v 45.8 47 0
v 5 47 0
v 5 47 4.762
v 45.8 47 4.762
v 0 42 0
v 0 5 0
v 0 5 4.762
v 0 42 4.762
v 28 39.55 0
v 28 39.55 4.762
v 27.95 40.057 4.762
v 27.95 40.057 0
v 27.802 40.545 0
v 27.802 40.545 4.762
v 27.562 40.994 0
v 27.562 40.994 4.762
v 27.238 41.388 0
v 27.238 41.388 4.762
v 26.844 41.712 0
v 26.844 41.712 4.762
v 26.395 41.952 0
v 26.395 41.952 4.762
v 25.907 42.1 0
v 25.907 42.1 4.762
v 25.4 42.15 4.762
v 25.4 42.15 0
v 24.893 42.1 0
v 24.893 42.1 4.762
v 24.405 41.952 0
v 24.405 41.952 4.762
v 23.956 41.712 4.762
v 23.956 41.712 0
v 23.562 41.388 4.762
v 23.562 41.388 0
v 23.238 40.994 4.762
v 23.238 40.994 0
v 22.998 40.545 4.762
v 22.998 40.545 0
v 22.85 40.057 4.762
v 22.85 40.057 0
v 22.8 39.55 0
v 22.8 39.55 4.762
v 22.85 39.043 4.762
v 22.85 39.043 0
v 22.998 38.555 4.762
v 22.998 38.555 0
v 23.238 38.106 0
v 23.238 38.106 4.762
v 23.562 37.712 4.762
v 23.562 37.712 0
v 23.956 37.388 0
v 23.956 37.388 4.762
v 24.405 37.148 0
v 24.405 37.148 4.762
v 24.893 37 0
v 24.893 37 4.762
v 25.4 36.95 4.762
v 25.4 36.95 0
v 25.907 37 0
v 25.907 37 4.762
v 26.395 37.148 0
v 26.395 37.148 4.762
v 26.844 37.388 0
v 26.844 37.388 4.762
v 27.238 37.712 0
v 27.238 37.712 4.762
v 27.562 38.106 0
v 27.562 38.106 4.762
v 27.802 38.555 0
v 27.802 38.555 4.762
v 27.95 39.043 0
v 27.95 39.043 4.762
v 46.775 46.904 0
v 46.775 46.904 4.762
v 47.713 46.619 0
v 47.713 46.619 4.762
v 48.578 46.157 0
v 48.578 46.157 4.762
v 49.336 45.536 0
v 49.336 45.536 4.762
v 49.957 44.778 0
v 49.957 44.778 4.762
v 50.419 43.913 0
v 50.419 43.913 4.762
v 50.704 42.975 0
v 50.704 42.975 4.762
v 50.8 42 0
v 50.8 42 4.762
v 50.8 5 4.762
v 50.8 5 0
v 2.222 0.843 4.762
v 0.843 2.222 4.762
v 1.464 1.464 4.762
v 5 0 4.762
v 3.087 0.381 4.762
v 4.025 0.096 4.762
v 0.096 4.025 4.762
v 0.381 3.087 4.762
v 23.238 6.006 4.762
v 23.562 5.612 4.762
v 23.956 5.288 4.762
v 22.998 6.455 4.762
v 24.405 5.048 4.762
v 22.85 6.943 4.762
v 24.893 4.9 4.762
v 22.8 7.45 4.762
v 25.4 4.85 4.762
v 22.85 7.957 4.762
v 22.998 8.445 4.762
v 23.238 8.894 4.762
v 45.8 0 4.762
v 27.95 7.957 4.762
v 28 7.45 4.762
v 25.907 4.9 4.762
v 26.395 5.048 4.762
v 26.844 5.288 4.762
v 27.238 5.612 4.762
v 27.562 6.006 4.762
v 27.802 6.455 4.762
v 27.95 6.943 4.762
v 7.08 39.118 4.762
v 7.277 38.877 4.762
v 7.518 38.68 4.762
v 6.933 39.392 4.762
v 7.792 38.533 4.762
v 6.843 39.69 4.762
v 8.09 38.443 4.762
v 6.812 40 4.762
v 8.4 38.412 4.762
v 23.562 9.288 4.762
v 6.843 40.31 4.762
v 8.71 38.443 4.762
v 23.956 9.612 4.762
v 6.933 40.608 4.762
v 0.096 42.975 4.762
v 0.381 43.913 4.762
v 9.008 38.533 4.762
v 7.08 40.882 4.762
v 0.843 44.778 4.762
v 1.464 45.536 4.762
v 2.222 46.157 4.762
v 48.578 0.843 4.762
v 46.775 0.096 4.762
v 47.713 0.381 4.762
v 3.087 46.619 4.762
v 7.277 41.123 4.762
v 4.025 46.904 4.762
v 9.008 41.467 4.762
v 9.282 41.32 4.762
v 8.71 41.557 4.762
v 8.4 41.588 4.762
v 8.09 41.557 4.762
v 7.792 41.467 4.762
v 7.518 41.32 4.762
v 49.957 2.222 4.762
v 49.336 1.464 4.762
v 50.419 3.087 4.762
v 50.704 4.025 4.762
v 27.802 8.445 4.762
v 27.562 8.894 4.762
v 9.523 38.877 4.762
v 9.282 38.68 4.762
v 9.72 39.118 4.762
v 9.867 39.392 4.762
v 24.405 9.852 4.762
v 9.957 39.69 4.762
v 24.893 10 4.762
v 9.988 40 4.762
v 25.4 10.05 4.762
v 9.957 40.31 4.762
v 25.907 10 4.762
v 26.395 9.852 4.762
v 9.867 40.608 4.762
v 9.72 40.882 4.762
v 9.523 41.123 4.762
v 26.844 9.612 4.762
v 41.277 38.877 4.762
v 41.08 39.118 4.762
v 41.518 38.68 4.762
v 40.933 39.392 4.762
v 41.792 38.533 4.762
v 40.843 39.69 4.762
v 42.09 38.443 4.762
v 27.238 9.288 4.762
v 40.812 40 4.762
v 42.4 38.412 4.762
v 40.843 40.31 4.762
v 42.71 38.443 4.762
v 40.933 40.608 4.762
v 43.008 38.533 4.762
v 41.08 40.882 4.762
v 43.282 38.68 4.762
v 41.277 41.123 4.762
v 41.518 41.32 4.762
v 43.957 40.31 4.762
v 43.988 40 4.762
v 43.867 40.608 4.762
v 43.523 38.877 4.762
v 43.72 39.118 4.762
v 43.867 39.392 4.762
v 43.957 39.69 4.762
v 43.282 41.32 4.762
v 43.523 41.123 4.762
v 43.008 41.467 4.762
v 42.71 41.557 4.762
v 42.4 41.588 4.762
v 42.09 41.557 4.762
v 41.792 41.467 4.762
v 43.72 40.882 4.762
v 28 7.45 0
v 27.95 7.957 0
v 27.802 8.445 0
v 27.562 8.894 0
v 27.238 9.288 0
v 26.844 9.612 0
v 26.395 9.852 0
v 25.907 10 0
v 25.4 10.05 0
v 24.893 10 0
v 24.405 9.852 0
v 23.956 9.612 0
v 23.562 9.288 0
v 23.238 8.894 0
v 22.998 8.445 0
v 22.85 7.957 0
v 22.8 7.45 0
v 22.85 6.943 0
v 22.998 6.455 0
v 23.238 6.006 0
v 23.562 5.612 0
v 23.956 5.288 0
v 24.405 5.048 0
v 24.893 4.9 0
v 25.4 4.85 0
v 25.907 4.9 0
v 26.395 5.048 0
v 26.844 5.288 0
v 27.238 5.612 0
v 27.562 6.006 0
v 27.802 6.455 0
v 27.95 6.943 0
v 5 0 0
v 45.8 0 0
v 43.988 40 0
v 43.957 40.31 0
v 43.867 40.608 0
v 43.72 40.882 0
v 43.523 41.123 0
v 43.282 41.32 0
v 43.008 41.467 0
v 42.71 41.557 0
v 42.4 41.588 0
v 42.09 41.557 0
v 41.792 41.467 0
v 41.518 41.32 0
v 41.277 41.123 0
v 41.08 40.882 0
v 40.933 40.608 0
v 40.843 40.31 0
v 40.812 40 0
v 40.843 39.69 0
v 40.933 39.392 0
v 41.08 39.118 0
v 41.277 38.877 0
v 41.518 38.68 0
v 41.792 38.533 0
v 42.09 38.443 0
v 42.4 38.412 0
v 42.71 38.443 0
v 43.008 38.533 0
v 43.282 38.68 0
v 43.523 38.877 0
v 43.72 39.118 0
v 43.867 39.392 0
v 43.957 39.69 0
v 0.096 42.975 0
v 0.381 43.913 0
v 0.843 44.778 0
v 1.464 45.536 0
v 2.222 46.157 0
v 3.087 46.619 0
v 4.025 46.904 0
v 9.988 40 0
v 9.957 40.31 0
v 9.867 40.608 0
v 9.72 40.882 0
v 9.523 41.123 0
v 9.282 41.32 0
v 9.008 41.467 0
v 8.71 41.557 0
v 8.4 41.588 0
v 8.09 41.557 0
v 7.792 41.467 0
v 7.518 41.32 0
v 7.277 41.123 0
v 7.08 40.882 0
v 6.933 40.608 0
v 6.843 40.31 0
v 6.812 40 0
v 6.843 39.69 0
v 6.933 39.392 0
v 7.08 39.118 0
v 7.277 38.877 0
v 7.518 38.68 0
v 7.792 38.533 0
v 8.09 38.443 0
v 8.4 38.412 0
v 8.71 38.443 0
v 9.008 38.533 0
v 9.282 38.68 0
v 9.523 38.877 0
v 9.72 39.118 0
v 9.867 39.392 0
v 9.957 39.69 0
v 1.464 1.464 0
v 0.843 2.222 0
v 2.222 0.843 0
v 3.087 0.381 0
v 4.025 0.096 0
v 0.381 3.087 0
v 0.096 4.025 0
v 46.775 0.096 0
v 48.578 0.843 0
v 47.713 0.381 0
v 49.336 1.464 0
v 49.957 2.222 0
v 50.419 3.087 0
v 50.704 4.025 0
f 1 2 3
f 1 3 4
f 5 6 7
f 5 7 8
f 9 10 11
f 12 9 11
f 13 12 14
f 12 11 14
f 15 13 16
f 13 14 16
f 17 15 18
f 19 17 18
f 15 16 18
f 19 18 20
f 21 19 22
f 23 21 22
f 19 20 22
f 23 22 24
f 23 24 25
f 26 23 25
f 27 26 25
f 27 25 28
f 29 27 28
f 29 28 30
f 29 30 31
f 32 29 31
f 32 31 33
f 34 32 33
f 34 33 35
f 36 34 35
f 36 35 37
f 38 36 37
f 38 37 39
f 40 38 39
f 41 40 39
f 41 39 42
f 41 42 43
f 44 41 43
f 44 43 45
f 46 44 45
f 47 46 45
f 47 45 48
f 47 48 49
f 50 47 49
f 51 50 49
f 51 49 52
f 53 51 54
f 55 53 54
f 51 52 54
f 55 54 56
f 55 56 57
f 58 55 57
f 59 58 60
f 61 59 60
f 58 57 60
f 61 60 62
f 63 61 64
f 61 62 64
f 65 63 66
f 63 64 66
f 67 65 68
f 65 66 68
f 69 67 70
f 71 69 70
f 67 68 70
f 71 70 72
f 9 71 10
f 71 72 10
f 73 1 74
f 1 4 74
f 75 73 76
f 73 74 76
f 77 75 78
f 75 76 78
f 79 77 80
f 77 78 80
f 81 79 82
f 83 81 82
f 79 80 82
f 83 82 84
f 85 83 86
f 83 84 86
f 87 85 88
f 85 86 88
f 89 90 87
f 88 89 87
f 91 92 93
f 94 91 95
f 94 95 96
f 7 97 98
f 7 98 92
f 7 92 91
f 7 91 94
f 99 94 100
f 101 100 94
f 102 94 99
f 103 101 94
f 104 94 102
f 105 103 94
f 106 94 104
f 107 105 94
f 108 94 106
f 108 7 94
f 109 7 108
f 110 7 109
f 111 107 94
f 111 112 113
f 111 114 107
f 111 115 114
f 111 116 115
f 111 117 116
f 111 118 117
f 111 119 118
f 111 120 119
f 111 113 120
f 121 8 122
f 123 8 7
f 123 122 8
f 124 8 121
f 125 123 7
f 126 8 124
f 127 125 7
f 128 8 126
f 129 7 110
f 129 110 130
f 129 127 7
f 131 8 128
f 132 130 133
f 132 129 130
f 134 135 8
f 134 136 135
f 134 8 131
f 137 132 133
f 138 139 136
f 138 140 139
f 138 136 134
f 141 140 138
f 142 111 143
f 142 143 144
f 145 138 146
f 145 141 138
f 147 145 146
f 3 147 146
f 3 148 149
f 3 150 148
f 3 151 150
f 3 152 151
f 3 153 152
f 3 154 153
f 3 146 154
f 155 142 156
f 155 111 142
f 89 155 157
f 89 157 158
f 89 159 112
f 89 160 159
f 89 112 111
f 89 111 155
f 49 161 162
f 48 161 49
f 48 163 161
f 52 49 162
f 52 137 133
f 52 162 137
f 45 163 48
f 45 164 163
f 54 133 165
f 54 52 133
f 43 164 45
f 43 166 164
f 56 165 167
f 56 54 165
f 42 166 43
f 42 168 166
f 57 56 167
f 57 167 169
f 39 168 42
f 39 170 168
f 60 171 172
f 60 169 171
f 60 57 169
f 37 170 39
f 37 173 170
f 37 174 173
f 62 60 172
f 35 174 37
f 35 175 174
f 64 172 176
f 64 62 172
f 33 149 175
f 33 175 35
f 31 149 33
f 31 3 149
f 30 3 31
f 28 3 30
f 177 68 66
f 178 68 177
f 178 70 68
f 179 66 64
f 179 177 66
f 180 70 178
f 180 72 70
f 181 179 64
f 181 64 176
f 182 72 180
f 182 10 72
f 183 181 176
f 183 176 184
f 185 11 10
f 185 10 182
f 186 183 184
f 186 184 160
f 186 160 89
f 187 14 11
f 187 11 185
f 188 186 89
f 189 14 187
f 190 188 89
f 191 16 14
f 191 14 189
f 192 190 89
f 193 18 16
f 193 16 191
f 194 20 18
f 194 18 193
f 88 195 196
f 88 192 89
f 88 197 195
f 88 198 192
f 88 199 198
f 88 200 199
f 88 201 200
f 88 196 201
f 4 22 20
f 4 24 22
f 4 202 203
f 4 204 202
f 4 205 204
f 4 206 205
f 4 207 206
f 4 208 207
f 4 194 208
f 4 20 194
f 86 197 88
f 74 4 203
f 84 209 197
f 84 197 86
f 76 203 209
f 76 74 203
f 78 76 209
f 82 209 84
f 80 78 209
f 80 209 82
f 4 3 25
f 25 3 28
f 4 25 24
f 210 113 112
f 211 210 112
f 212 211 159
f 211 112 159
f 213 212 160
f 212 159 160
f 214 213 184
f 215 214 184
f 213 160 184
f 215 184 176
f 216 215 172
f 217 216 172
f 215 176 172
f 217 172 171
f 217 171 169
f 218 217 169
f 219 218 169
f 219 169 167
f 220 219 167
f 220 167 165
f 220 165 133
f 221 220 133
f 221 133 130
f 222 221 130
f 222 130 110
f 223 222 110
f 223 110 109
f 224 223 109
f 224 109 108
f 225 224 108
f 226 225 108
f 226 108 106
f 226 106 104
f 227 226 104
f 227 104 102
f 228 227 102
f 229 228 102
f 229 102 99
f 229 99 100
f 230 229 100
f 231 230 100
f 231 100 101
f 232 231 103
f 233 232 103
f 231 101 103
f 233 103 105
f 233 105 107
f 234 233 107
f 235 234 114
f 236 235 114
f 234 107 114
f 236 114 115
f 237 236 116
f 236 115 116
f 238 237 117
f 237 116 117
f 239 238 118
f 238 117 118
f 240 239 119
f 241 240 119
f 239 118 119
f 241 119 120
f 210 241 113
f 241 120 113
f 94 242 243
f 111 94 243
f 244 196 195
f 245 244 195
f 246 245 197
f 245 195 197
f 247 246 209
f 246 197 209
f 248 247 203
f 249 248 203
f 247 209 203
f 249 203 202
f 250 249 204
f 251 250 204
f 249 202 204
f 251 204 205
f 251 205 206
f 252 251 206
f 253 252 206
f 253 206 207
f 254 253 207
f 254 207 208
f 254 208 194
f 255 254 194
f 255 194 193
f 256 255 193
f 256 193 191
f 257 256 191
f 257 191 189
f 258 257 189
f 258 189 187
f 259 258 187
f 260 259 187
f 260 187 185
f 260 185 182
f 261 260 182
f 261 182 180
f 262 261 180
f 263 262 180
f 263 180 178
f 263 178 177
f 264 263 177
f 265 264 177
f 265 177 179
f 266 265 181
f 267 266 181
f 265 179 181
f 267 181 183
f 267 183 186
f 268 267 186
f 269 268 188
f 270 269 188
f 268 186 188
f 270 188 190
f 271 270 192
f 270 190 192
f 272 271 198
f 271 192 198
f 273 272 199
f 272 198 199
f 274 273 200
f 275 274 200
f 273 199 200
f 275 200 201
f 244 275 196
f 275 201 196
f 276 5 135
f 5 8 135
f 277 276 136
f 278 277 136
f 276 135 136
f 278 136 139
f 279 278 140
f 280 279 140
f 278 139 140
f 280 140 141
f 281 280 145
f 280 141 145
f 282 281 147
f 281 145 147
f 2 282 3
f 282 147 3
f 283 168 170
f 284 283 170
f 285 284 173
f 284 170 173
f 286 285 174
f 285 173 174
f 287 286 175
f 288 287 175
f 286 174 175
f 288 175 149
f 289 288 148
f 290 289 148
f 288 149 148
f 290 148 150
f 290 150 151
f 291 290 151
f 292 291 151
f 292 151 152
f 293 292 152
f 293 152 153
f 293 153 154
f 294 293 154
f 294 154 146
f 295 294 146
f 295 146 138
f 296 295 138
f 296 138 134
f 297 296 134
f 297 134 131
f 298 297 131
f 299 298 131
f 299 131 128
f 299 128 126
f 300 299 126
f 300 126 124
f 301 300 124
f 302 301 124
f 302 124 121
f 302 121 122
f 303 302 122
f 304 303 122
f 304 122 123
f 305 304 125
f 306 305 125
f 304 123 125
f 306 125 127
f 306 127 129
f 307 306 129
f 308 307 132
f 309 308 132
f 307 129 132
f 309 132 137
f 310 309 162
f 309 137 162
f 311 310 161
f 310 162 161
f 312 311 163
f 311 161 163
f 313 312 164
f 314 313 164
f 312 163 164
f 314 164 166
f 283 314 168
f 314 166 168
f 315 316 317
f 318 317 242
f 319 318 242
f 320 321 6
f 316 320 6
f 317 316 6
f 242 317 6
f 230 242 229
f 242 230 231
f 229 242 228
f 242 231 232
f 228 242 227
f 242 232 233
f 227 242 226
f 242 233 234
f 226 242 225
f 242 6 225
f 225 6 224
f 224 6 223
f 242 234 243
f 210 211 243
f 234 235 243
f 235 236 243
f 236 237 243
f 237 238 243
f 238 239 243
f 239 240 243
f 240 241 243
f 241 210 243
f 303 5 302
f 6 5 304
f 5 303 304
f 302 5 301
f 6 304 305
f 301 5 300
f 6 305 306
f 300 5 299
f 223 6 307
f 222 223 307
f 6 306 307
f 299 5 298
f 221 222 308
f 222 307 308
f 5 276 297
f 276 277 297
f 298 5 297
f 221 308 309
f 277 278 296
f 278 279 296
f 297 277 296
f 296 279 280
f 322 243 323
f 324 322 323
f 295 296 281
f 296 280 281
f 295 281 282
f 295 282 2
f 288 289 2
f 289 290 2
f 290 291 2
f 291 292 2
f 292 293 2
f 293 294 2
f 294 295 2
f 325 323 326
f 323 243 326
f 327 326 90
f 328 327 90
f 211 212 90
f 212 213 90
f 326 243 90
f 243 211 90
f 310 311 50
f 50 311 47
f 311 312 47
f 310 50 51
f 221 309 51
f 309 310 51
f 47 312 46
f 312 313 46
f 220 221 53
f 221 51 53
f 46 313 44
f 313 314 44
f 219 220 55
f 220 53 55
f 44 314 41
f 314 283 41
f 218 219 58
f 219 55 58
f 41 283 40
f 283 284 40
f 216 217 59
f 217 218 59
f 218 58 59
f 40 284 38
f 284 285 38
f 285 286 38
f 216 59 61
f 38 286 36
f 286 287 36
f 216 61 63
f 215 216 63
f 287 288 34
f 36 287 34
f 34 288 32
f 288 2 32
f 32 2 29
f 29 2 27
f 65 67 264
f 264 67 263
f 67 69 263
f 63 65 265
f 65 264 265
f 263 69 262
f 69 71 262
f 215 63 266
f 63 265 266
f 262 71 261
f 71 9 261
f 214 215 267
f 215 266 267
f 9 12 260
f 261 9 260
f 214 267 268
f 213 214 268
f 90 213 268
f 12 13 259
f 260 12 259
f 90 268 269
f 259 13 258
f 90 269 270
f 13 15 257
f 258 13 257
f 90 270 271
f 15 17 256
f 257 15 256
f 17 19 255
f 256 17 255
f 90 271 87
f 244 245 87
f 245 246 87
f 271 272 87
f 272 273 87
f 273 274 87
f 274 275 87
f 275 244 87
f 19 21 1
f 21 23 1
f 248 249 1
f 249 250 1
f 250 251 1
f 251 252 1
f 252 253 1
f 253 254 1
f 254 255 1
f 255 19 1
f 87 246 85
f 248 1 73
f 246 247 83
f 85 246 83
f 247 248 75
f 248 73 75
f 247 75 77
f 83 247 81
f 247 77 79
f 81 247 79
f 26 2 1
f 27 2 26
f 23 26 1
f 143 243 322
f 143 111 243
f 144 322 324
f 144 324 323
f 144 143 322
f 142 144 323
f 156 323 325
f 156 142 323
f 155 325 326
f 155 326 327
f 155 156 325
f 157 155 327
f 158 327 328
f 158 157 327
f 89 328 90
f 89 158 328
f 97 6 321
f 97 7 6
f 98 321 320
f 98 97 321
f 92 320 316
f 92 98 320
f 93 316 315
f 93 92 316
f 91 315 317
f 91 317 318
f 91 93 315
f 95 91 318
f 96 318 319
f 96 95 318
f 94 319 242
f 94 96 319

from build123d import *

# Parameters (mm, degrees)
CROQUIS1_W              = 50.8
CROQUIS1_H              = 47
SALIENTE_EXTRUIR1_DEPTH = 4.7625
CROQUIS4_R              = 2.6
CORTAR_EXTRUIR2_DEPTH   = 5.7625
REDONDEO1_R             = 5
CROQUIS7_R              = 1.5875
CORTAR_EXTRUIR5_DEPTH   = 10


with BuildPart() as part:
    # Croquis1 → Saliente-Extruir1 (new body)
    with BuildSketch(Plane.XY):
        with Locations((25.4, 23.5)):
            Rectangle(CROQUIS1_W, CROQUIS1_H)
    extrude(amount=SALIENTE_EXTRUIR1_DEPTH)

    # Croquis4 → Cortar-Extruir2 (cut, through all)
    with BuildSketch(Plane.XY.offset(4.7625)):
        with Locations((25.4, 39.55)):
            Circle(CROQUIS4_R)
        with Locations((25.4, 7.45)):
            Circle(CROQUIS4_R)
    extrude(amount=-CORTAR_EXTRUIR2_DEPTH, mode=Mode.SUBTRACT)

    # Redondeo1
    redondeo1_edges = [part.edges().sort_by_distance(p)[0] for p in [
        (0, 47, 2.38125),
        (50.8, 47, 2.38125),
        (50.8, 0, 2.38125),
        (0, 0, 2.38125),
    ]]
    fillet(redondeo1_edges, radius=REDONDEO1_R)

    # Croquis7 → Cortar-Extruir5 (cut)
    with BuildSketch(Plane.XY.offset(4.7625)):
        with Locations((8.4, 40)):
            Circle(CROQUIS7_R)
        with Locations((42.4, 40)):
            Circle(CROQUIS7_R)
    extrude(amount=-CORTAR_EXTRUIR5_DEPTH, mode=Mode.SUBTRACT)


solid = part.part
